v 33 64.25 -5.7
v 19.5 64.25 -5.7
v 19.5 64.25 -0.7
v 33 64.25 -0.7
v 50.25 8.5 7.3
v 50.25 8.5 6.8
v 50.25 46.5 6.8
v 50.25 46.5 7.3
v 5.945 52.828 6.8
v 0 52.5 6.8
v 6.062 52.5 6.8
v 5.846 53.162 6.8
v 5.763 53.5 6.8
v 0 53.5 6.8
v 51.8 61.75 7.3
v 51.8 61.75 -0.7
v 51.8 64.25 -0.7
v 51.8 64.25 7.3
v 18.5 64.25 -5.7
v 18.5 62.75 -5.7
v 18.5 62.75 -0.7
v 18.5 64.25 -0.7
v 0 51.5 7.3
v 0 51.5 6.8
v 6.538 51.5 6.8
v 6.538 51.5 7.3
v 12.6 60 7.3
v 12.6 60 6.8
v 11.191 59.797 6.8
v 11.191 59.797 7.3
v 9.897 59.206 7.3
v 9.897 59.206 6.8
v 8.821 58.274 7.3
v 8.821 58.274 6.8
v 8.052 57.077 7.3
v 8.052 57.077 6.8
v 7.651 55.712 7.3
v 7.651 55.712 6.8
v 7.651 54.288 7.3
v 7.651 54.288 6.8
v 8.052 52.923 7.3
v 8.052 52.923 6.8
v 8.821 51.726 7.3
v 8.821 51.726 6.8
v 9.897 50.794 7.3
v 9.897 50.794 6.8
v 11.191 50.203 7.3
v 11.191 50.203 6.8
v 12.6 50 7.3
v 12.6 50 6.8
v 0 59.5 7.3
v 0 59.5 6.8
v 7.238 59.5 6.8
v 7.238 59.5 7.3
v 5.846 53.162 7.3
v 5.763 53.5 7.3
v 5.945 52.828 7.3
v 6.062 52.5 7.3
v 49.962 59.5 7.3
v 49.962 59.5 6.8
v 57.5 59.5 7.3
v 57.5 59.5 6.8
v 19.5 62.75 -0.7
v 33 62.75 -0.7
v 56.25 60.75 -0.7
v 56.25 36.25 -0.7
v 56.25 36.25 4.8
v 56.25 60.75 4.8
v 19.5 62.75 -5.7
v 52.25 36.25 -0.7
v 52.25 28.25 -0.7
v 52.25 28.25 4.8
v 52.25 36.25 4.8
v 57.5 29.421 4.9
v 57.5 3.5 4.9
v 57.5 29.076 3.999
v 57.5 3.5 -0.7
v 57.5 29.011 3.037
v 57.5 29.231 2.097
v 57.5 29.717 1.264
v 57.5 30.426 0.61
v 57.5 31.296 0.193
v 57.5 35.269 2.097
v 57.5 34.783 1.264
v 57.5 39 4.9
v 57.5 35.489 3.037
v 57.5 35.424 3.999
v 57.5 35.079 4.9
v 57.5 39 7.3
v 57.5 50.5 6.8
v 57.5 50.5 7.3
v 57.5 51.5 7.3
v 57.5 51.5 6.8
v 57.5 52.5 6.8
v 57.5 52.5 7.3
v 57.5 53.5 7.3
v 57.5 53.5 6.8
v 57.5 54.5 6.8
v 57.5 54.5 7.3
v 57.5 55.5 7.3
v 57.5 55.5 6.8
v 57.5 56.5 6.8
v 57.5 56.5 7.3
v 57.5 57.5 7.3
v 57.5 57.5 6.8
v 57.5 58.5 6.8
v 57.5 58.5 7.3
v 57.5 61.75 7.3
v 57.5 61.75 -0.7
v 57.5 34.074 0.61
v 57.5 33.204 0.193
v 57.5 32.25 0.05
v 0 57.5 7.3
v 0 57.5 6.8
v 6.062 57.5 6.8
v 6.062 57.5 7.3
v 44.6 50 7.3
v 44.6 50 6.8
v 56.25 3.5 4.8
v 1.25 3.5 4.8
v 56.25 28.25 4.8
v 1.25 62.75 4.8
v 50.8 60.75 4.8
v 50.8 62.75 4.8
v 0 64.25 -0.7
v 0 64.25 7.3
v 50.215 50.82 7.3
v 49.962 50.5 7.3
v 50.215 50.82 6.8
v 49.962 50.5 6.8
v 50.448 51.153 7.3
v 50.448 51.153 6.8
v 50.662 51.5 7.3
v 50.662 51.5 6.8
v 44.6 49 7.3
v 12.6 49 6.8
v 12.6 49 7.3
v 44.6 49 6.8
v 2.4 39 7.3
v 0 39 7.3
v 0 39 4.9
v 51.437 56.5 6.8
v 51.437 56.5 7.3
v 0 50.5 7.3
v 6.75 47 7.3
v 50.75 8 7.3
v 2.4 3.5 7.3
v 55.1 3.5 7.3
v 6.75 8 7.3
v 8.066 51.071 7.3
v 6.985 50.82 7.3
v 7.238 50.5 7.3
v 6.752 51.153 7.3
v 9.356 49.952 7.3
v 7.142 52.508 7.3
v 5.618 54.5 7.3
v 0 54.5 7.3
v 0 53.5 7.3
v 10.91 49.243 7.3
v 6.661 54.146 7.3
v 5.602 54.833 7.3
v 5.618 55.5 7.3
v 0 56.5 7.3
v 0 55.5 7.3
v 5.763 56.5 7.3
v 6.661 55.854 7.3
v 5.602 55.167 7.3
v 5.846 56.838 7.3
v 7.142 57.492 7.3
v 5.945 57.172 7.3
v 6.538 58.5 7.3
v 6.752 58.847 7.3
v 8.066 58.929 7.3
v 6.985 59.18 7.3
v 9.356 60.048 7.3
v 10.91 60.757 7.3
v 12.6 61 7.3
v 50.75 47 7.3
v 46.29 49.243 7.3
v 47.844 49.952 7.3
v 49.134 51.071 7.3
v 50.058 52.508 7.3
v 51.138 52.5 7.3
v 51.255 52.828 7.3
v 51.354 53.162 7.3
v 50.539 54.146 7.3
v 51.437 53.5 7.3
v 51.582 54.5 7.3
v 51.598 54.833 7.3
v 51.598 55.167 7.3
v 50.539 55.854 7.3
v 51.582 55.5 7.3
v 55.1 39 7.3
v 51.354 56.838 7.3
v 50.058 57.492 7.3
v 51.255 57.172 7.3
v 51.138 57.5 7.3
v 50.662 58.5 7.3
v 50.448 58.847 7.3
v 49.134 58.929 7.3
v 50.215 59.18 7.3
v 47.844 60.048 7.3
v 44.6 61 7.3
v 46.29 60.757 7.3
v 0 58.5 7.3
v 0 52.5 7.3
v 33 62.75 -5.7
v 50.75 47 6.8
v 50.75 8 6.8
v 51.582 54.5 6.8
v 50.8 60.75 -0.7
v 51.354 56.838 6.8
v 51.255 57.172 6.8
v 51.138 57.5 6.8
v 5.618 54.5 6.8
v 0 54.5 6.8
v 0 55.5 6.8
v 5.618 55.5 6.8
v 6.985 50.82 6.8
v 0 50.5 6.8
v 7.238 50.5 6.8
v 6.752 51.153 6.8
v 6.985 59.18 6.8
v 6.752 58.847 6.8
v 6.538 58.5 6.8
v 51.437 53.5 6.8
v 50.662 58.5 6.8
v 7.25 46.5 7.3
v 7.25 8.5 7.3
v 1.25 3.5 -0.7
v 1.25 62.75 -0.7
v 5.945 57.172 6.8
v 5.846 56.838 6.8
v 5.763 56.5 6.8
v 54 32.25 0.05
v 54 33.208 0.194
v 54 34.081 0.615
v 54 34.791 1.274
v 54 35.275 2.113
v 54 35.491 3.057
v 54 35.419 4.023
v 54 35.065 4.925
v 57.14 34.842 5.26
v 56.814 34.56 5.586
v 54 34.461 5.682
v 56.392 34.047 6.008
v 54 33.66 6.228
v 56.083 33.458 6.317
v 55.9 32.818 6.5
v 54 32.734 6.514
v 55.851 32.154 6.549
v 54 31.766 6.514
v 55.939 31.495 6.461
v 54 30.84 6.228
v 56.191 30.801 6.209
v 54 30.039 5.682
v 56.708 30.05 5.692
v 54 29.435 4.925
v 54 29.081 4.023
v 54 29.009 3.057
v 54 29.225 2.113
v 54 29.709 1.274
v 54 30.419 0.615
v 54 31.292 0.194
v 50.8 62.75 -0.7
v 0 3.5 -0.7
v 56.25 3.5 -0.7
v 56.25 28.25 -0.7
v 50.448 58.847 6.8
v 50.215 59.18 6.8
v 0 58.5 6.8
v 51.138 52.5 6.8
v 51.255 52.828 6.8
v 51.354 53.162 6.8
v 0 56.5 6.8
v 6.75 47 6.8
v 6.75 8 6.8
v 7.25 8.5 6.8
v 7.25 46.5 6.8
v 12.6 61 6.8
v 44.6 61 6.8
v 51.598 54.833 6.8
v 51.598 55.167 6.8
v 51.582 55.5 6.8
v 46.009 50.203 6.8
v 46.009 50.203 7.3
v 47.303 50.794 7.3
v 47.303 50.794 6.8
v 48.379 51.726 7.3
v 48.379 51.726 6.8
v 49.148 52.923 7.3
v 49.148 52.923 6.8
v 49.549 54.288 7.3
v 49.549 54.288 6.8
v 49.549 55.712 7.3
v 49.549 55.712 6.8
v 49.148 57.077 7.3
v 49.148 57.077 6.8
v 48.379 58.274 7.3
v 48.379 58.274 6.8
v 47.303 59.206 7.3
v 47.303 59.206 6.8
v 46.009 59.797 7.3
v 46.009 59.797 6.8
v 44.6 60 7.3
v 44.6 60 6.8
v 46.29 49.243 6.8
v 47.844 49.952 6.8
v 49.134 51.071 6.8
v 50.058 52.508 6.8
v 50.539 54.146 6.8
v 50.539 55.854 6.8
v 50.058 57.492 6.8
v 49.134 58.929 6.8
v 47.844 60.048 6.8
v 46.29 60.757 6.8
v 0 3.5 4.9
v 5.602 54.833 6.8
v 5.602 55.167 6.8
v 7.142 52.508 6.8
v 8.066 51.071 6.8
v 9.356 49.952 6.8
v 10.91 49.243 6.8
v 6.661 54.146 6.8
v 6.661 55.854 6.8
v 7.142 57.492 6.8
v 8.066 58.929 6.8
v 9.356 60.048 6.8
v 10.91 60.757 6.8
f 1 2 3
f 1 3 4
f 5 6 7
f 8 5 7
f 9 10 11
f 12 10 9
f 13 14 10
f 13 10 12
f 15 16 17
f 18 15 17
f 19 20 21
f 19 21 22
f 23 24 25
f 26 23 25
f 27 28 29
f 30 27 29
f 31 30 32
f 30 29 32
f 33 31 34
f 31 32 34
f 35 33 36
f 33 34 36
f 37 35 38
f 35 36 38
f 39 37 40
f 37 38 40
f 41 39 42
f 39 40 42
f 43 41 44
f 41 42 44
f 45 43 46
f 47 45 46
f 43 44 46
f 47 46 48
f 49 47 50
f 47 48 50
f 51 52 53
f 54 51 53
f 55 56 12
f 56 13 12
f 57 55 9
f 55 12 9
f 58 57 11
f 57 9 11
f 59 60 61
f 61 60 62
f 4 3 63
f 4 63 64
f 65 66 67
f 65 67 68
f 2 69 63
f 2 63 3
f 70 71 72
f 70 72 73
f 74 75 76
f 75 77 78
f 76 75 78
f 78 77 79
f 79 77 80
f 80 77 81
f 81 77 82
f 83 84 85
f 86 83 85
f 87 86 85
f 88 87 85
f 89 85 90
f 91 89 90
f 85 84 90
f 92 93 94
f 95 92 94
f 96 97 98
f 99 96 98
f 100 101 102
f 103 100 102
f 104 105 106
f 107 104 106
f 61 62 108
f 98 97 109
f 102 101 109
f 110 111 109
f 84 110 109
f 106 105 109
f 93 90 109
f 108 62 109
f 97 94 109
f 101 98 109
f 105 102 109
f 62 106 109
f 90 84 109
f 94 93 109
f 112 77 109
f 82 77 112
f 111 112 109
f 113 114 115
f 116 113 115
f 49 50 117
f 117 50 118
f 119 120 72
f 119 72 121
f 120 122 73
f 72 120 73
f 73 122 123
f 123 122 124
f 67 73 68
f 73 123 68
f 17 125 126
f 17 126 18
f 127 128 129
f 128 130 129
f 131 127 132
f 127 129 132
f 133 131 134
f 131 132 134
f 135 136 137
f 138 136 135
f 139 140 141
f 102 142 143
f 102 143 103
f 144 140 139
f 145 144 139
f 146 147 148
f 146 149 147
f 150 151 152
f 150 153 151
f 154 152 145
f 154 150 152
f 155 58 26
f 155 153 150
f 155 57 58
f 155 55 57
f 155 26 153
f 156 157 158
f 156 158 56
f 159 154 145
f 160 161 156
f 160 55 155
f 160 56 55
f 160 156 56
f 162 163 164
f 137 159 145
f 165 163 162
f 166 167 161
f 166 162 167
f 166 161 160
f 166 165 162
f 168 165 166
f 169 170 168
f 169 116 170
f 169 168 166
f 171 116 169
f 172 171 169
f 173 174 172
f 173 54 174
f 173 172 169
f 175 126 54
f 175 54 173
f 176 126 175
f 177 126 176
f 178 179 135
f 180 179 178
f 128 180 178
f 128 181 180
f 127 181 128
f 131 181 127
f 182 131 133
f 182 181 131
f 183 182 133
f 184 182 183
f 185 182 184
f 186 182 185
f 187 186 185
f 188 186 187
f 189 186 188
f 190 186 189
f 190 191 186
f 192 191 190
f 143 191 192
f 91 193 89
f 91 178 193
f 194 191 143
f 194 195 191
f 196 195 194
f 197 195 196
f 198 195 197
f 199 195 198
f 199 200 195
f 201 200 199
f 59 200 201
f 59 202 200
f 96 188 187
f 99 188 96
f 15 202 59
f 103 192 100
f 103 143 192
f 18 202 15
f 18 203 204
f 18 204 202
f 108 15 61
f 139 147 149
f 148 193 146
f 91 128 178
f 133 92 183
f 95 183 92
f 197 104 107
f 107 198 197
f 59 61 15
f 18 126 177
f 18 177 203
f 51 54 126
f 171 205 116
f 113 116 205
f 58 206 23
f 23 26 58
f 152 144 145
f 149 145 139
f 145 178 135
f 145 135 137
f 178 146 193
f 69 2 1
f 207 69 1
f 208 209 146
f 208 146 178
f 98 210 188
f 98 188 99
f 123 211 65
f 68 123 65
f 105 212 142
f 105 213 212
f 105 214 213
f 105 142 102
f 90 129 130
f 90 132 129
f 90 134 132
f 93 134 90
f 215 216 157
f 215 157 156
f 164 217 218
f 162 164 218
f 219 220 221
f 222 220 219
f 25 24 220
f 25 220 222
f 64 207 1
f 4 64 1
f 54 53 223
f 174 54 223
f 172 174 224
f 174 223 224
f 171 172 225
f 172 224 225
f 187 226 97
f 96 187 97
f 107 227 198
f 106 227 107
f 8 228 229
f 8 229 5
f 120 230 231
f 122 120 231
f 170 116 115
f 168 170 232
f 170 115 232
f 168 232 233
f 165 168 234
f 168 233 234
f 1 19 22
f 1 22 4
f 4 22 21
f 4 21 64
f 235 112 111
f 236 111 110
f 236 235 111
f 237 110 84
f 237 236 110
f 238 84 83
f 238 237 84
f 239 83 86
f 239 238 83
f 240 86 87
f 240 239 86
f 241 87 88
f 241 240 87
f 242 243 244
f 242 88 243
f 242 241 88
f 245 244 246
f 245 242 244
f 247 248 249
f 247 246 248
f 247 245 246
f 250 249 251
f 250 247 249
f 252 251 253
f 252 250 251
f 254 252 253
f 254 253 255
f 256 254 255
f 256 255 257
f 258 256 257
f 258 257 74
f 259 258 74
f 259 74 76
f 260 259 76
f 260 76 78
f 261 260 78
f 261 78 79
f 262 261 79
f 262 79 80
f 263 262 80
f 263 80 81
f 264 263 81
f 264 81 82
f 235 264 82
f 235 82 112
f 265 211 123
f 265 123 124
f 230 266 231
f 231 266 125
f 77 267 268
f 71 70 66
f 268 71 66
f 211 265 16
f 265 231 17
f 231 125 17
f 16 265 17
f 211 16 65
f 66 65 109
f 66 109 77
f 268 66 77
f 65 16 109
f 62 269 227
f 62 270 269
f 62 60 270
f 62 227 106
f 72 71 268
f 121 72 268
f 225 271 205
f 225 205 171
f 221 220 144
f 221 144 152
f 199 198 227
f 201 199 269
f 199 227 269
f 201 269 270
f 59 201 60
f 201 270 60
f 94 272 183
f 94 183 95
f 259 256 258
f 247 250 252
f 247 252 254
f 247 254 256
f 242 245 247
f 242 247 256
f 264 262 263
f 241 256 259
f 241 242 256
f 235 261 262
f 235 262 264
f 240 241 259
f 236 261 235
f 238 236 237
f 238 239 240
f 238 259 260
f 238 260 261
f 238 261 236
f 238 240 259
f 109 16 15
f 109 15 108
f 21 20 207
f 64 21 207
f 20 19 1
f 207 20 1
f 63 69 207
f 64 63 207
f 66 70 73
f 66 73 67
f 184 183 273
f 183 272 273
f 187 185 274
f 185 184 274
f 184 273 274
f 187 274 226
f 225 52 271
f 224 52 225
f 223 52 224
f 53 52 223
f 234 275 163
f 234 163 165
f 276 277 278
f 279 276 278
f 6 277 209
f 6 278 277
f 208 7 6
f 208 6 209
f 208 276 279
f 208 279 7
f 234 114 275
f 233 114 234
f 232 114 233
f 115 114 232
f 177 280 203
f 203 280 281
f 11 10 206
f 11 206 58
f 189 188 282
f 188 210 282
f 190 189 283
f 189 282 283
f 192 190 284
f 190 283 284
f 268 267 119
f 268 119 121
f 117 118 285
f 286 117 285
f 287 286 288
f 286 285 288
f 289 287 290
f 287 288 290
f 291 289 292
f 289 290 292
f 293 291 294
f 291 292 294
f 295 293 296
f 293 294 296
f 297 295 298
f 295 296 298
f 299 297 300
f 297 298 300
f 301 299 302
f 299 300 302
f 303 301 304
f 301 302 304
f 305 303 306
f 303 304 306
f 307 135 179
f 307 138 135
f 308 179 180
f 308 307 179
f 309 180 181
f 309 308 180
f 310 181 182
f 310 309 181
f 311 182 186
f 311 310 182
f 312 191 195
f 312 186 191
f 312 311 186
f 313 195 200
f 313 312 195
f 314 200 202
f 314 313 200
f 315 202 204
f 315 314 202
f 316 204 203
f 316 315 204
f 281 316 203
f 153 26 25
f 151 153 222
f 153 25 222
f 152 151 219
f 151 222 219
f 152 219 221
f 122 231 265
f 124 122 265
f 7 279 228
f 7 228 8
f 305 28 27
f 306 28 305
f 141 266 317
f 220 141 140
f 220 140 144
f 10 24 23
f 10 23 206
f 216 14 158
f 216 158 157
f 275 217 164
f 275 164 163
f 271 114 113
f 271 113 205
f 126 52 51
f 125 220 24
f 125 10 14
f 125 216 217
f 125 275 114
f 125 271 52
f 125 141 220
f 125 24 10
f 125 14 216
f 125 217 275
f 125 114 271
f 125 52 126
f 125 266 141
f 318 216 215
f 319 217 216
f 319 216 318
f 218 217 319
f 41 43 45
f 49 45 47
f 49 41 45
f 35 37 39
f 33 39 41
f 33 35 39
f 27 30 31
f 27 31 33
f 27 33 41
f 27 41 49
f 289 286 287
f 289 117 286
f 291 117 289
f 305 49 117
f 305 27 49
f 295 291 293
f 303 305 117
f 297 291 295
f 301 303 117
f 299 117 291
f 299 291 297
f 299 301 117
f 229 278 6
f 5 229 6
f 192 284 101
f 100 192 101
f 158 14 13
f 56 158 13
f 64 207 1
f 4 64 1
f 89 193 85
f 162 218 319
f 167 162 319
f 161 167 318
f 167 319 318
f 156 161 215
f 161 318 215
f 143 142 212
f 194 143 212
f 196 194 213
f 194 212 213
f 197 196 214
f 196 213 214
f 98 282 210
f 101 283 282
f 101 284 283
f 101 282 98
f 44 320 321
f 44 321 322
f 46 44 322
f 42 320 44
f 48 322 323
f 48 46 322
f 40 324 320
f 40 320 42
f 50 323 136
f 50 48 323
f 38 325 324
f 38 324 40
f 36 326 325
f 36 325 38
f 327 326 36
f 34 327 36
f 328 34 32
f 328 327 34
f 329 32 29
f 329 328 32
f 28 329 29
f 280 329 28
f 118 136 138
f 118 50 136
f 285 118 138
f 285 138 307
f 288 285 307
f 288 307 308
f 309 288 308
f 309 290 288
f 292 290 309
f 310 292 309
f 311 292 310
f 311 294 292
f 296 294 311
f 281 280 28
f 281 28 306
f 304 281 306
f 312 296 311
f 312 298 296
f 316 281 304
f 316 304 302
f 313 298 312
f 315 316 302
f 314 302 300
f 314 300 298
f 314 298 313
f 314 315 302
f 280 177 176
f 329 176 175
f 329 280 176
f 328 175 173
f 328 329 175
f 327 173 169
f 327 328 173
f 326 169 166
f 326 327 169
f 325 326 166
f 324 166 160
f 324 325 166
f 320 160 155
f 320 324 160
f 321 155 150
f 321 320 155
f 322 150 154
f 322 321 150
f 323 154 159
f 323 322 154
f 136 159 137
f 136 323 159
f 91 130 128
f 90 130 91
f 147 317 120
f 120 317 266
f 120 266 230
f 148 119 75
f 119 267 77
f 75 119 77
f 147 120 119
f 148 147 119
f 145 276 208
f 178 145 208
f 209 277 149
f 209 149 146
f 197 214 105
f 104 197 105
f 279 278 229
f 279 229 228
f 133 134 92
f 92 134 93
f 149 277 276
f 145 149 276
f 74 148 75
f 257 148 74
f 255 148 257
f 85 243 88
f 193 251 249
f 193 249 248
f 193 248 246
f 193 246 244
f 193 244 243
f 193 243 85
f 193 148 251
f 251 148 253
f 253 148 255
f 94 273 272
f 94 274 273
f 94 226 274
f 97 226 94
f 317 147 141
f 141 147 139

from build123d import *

# Parameters (mm, degrees)
BOX056_W          = 13.5
BOX056_H          = 1.5
BOX056_DEPTH      = 5
BOX017_W          = 43
BOX017_H          = 38
BOX017_DEPTH      = 0.5
BOX041_W          = 44
BOX041_H          = 39
BOX041_DEPTH      = 0.5
CYLINDER_R        = 3.25
CYLINDER_DEPTH    = 3.5
BOX008_W          = 57.5
BOX008_H          = 35.5
BOX008_DEPTH      = 2.5
CHAMFER_SIZE      = 2.4
BOX001_W          = 5.7
BOX001_H          = 2.5
BOX001_DEPTH      = 6
BOX003_W          = 5.5
BOX003_H          = 3.5
BOX003_DEPTH      = 6
BOX002_W          = 55
BOX002_H          = 62.75
BOX002_DEPTH      = 5.5
BOX_W             = 57.5
BOX_H             = 60.75
BOX_DEPTH         = 5.5
CYLINDER011_R     = 5
CYLINDER011_DEPTH = 0.5
BOX055_W          = 32
BOX055_H          = 10
BOX055_DEPTH      = 0.5
CYLINDER010_R     = 5
CYLINDER010_DEPTH = 0.5
BOX044_W          = 32
BOX044_H          = 12
BOX044_DEPTH      = 1
CYLINDER007_R     = 6
CYLINDER007_DEPTH = 1
CYLINDER006_R     = 6
CYLINDER006_DEPTH = 1
CYLINDER008_R     = 7
CYLINDER008_DEPTH = 1
BOX047_W          = 10
BOX047_H          = 1
BOX047_DEPTH      = 1
BOX049_W          = 10
BOX049_H          = 1
BOX049_DEPTH      = 1
BOX048_W          = 10
BOX048_H          = 1
BOX048_DEPTH      = 1
BOX046_W          = 10
BOX046_H          = 1
BOX046_DEPTH      = 1
BOX045_W          = 10
BOX045_H          = 1
BOX045_DEPTH      = 1
CYLINDER009_R     = 7
CYLINDER009_DEPTH = 1
BOX051_W          = 10
BOX051_H          = 1
BOX051_DEPTH      = 1
BOX054_W          = 10
BOX054_H          = 1
BOX054_DEPTH      = 1
BOX053_W          = 10
BOX053_H          = 1
BOX053_DEPTH      = 1
BOX052_W          = 10
BOX052_H          = 1
BOX052_DEPTH      = 1
BOX050_W          = 10
BOX050_H          = 1
BOX050_DEPTH      = 1
BOX010_W          = 10
BOX010_H          = 10
BOX010_DEPTH      = 10
BOX007_W          = 57.5
BOX007_H          = 25.25
BOX007_DEPTH      = 2.5
BOX057_W          = 4
BOX057_H          = 8
BOX057_DEPTH      = 6
BOX058_W          = 14.5
BOX058_H          = 1.5
BOX058_DEPTH      = 5


with BuildPart() as cube_sd_card_cover:
    # Box056 → Box056 (new body)
    with BuildSketch(Plane(origin=(19.5, 62.75, -5.7), x_dir=(1, 0, 0), z_dir=(0, 0, 1))):
        with Locations((6.75, 0.75)):
            Rectangle(BOX056_W, BOX056_H)
    extrude(amount=BOX056_DEPTH)


with BuildPart() as cube_game_lable_inner:
    # Box017 → Box017 (new body)
    with BuildSketch(Plane(origin=(7.25, 8.5, 6.8), x_dir=(1, 0, 0), z_dir=(0, 0, 1))):
        with Locations((21.5, 19)):
            Rectangle(BOX017_W, BOX017_H)
    extrude(amount=BOX017_DEPTH)


with BuildPart() as cube_game_lable_outer:
    # Box041 → Box041 (new body)
    with BuildSketch(Plane(origin=(6.75, 8, 6.8), x_dir=(1, 0, 0), z_dir=(0, 0, 1))):
        with Locations((22, 19.5)):
            Rectangle(BOX041_W, BOX041_H)
    extrude(amount=BOX041_DEPTH)


with BuildPart() as cylinder_magnet:
    # Cylinder → Cylinder (new body)
    with BuildSketch(Plane(origin=(54, 32.25, 3.3), x_dir=(0, 0, -1), z_dir=(1, 0, 0))):
        Circle(CYLINDER_R)
    extrude(amount=CYLINDER_DEPTH)


with BuildPart() as chamfer_body:
    # Box008 → Box008 (new body)
    with BuildSketch(Plane(origin=(0, 3.5, 4.8), x_dir=(1, 0, 0), z_dir=(0, 0, 1))):
        with Locations((28.75, 17.75)):
            Rectangle(BOX008_W, BOX008_H)
    extrude(amount=BOX008_DEPTH)

    # Chamfer
    chamfer_edges = [chamfer_body.edges().sort_by_distance(p)[0] for p in [
        (0, 21.25, 7.3),
        (57.5, 21.25, 7.3),
    ]]
    chamfer(chamfer_edges, length=CHAMFER_SIZE)


with BuildPart() as cube_corner_inner:
    # Box001 → Box001 (new body)
    with BuildSketch(Plane(origin=(51.8, 61.75, -0.7), x_dir=(1, 0, 0), z_dir=(0, 0, 1))):
        with Locations((2.85, 1.25)):
            Rectangle(BOX001_W, BOX001_H)
    extrude(amount=BOX001_DEPTH)


with BuildPart() as cube_corner_outer:
    # Box003 → Box003 (new body)
    with BuildSketch(Plane(origin=(50.8, 60.75, -0.7), x_dir=(1, 0, 0), z_dir=(0, 0, 1))):
        with Locations((2.75, 1.75)):
            Rectangle(BOX003_W, BOX003_H)
    extrude(amount=BOX003_DEPTH)


with BuildPart() as cube_inner_base:
    # Box002 → Box002 (new body)
    with BuildSketch(Plane(origin=(1.25, 0, -0.7), x_dir=(1, 0, 0), z_dir=(0, 0, 1))):
        with Locations((27.5, 31.375)):
            Rectangle(BOX002_W, BOX002_H)
    extrude(amount=BOX002_DEPTH)


with BuildPart() as cut024:
    # Box → Box (new body)
    with BuildSketch(Plane(origin=(0, 3.5, -0.7), x_dir=(1, 0, 0), z_dir=(0, 0, 1))):
        with Locations((28.75, 30.375)):
            Rectangle(BOX_W, BOX_H)
    extrude(amount=BOX_DEPTH)

    # Cut: cut Cube(inner_base)
    add(cube_inner_base.part, mode=Mode.SUBTRACT)

    # Fusion: union Cube(corner_outer)
    add(cube_corner_outer.part)

    # Cut024: cut Cube(corner_inner)
    add(cube_corner_inner.part, mode=Mode.SUBTRACT)


with BuildPart() as cylinder002_right_nintendo_inner:
    # Cylinder011 → Cylinder011 (new body)
    with BuildSketch(Plane(origin=(44.6, 55, 6.8), x_dir=(1, 0, 0), z_dir=(0, 0, 1))):
        Circle(CYLINDER011_R)
    extrude(amount=CYLINDER011_DEPTH)


with BuildPart() as cube_middle_nintendo_inner:
    # Box055 → Box055 (new body)
    with BuildSketch(Plane(origin=(12.6, 50, 6.8), x_dir=(1, 0, 0), z_dir=(0, 0, 1))):
        with Locations((16, 5)):
            Rectangle(BOX055_W, BOX055_H)
    extrude(amount=BOX055_DEPTH)


with BuildPart() as fusion033:
    # Cylinder010 → Cylinder010 (new body)
    with BuildSketch(Plane(origin=(12.6, 55, 6.8), x_dir=(1, 0, 0), z_dir=(0, 0, 1))):
        Circle(CYLINDER010_R)
    extrude(amount=CYLINDER010_DEPTH)

    # Fusion033: union Cylinder002(right_nintendo_inner), Cube(middle_nintendo_inner)
    add(cylinder002_right_nintendo_inner.part)
    add(cube_middle_nintendo_inner.part)


with BuildPart() as cube_middle_nintendo_outer:
    # Box044 → Box044 (new body)
    with BuildSketch(Plane(origin=(12.6, 49, 6.8), x_dir=(1, 0, 0), z_dir=(0, 0, 1))):
        with Locations((16, 6)):
            Rectangle(BOX044_W, BOX044_H)
    extrude(amount=BOX044_DEPTH)


with BuildPart() as cylinder002_right_nintendo_outer:
    # Cylinder007 → Cylinder007 (new body)
    with BuildSketch(Plane(origin=(44.6, 55, 6.8), x_dir=(1, 0, 0), z_dir=(0, 0, 1))):
        Circle(CYLINDER007_R)
    extrude(amount=CYLINDER007_DEPTH)


with BuildPart() as cylinder001_left_nintendo_outer:
    # Cylinder006 → Cylinder006 (new body)
    with BuildSketch(Plane(origin=(12.6, 55, 6.8), x_dir=(1, 0, 0), z_dir=(0, 0, 1))):
        Circle(CYLINDER006_R)
    extrude(amount=CYLINDER006_DEPTH)


with BuildPart() as cylinder001_left_nintendo_fin_cut:
    # Cylinder008 → Cylinder008 (new body)
    with BuildSketch(Plane(origin=(12.6, 55, 6.8), x_dir=(1, 0, 0), z_dir=(0, 0, 1))):
        Circle(CYLINDER008_R)
    extrude(amount=CYLINDER008_DEPTH)


with BuildPart() as box047:
    # Box047 → Box047 (new body)
    with BuildSketch(Plane(origin=(0, 54.5, 6.8), x_dir=(1, 0, 0), z_dir=(0, 0, 1))):
        with Locations((5, 0.5)):
            Rectangle(BOX047_W, BOX047_H)
    extrude(amount=BOX047_DEPTH)


with BuildPart() as box049:
    # Box049 → Box049 (new body)
    with BuildSketch(Plane(origin=(0, 58.5, 6.8), x_dir=(1, 0, 0), z_dir=(0, 0, 1))):
        with Locations((5, 0.5)):
            Rectangle(BOX049_W, BOX049_H)
    extrude(amount=BOX049_DEPTH)


with BuildPart() as box048:
    # Box048 → Box048 (new body)
    with BuildSketch(Plane(origin=(0, 56.5, 6.8), x_dir=(1, 0, 0), z_dir=(0, 0, 1))):
        with Locations((5, 0.5)):
            Rectangle(BOX048_W, BOX048_H)
    extrude(amount=BOX048_DEPTH)


with BuildPart() as box046:
    # Box046 → Box046 (new body)
    with BuildSketch(Plane(origin=(0, 52.5, 6.8), x_dir=(1, 0, 0), z_dir=(0, 0, 1))):
        with Locations((5, 0.5)):
            Rectangle(BOX046_W, BOX046_H)
    extrude(amount=BOX046_DEPTH)


with BuildPart() as cut009:
    # Box045 → Box045 (new body)
    with BuildSketch(Plane(origin=(0, 50.5, 6.8), x_dir=(1, 0, 0), z_dir=(0, 0, 1))):
        with Locations((5, 0.5)):
            Rectangle(BOX045_W, BOX045_H)
    extrude(amount=BOX045_DEPTH)

    # Fusion004: union Box047, Box049, Box048, Box046
    add(box047.part)
    add(box049.part)
    add(box048.part)
    add(box046.part)

    # Cut009: cut Cylinder001(left_nintendo_fin_cut)
    add(cylinder001_left_nintendo_fin_cut.part, mode=Mode.SUBTRACT)


with BuildPart() as cylinder002_right_nintendo_fin_cut:
    # Cylinder009 → Cylinder009 (new body)
    with BuildSketch(Plane(origin=(44.6, 55, 6.8), x_dir=(1, 0, 0), z_dir=(0, 0, 1))):
        Circle(CYLINDER009_R)
    extrude(amount=CYLINDER009_DEPTH)


with BuildPart() as box051:
    # Box051 → Box051 (new body)
    with BuildSketch(Plane(origin=(47.5, 54.5, 6.8), x_dir=(1, 0, 0), z_dir=(0, 0, 1))):
        with Locations((5, 0.5)):
            Rectangle(BOX051_W, BOX051_H)
    extrude(amount=BOX051_DEPTH)


with BuildPart() as box054:
    # Box054 → Box054 (new body)
    with BuildSketch(Plane(origin=(47.5, 52.5, 6.8), x_dir=(1, 0, 0), z_dir=(0, 0, 1))):
        with Locations((5, 0.5)):
            Rectangle(BOX054_W, BOX054_H)
    extrude(amount=BOX054_DEPTH)


with BuildPart() as box053:
    # Box053 → Box053 (new body)
    with BuildSketch(Plane(origin=(47.5, 56.5, 6.8), x_dir=(1, 0, 0), z_dir=(0, 0, 1))):
        with Locations((5, 0.5)):
            Rectangle(BOX053_W, BOX053_H)
    extrude(amount=BOX053_DEPTH)


with BuildPart() as box052:
    # Box052 → Box052 (new body)
    with BuildSketch(Plane(origin=(47.5, 58.5, 6.8), x_dir=(1, 0, 0), z_dir=(0, 0, 1))):
        with Locations((5, 0.5)):
            Rectangle(BOX052_W, BOX052_H)
    extrude(amount=BOX052_DEPTH)


with BuildPart() as cut008:
    # Box050 → Box050 (new body)
    with BuildSketch(Plane(origin=(47.5, 50.5, 6.8), x_dir=(1, 0, 0), z_dir=(0, 0, 1))):
        with Locations((5, 0.5)):
            Rectangle(BOX050_W, BOX050_H)
    extrude(amount=BOX050_DEPTH)

    # Fusion003: union Box051, Box054, Box053, Box052
    add(box051.part)
    add(box054.part)
    add(box053.part)
    add(box052.part)

    # Cut008: cut Cylinder002(right_nintendo_fin_cut)
    add(cylinder002_right_nintendo_fin_cut.part, mode=Mode.SUBTRACT)


with BuildPart() as cube_top_corner_cut:
    # Box010 → Box010 (new body)
    with BuildSketch(Plane(origin=(51.8, 61.75, 0), x_dir=(1, 0, 0), z_dir=(0, 0, 1))):
        with Locations((5, 5)):
            Rectangle(BOX010_W, BOX010_H)
    extrude(amount=BOX010_DEPTH)


with BuildPart() as cut014:
    # Box007 → Box007 (new body)
    with BuildSketch(Plane(origin=(0, 39, 4.8), x_dir=(1, 0, 0), z_dir=(0, 0, 1))):
        with Locations((28.75, 12.625)):
            Rectangle(BOX007_W, BOX007_H)
    extrude(amount=BOX007_DEPTH)

    # Cut006: cut Cube(top_corner_cut)
    add(cube_top_corner_cut.part, mode=Mode.SUBTRACT)

    # Cut010: cut Cut008
    add(cut008.part, mode=Mode.SUBTRACT)

    # Cut011: cut Cut009
    add(cut009.part, mode=Mode.SUBTRACT)

    # Cut012: cut Cylinder001(left_nintendo_outer)
    add(cylinder001_left_nintendo_outer.part, mode=Mode.SUBTRACT)

    # Cut013: cut Cylinder002(right_nintendo_outer)
    add(cylinder002_right_nintendo_outer.part, mode=Mode.SUBTRACT)

    # Cut014: cut Cube(middle_nintendo_outer)
    add(cube_middle_nintendo_outer.part, mode=Mode.SUBTRACT)


with BuildPart() as fusion035:
    # Box057 → Box057 (new body)
    with BuildSketch(Plane(origin=(52.25, 28.25, -0.7), x_dir=(1, 0, 0), z_dir=(0, 0, 1))):
        with Locations((2, 4)):
            Rectangle(BOX057_W, BOX057_H)
    extrude(amount=BOX057_DEPTH)

    # Fusion034: union Chamfer body, Cut024, Fusion033, Cut014
    add(chamfer_body.part)
    add(cut024.part)
    add(fusion033.part)
    add(cut014.part)

    # Cut025: cut Cylinder(magnet)
    add(cylinder_magnet.part, mode=Mode.SUBTRACT)

    # Cut026: cut Cube(game_lable_outer)
    add(cube_game_lable_outer.part, mode=Mode.SUBTRACT)

    # Fusion035: union Cube(game_lable_inner)
    add(cube_game_lable_inner.part)


with BuildPart() as box058:
    # Box058 → Box058 (new body)
    with BuildSketch(Plane(origin=(18.5, 62.75, -5.7), x_dir=(1, 0, 0), z_dir=(0, 0, 1))):
        with Locations((7.25, 0.75)):
            Rectangle(BOX058_W, BOX058_H)
    extrude(amount=BOX058_DEPTH)


solid = Compound([cube_sd_card_cover.part, fusion035.part, box058.part])
